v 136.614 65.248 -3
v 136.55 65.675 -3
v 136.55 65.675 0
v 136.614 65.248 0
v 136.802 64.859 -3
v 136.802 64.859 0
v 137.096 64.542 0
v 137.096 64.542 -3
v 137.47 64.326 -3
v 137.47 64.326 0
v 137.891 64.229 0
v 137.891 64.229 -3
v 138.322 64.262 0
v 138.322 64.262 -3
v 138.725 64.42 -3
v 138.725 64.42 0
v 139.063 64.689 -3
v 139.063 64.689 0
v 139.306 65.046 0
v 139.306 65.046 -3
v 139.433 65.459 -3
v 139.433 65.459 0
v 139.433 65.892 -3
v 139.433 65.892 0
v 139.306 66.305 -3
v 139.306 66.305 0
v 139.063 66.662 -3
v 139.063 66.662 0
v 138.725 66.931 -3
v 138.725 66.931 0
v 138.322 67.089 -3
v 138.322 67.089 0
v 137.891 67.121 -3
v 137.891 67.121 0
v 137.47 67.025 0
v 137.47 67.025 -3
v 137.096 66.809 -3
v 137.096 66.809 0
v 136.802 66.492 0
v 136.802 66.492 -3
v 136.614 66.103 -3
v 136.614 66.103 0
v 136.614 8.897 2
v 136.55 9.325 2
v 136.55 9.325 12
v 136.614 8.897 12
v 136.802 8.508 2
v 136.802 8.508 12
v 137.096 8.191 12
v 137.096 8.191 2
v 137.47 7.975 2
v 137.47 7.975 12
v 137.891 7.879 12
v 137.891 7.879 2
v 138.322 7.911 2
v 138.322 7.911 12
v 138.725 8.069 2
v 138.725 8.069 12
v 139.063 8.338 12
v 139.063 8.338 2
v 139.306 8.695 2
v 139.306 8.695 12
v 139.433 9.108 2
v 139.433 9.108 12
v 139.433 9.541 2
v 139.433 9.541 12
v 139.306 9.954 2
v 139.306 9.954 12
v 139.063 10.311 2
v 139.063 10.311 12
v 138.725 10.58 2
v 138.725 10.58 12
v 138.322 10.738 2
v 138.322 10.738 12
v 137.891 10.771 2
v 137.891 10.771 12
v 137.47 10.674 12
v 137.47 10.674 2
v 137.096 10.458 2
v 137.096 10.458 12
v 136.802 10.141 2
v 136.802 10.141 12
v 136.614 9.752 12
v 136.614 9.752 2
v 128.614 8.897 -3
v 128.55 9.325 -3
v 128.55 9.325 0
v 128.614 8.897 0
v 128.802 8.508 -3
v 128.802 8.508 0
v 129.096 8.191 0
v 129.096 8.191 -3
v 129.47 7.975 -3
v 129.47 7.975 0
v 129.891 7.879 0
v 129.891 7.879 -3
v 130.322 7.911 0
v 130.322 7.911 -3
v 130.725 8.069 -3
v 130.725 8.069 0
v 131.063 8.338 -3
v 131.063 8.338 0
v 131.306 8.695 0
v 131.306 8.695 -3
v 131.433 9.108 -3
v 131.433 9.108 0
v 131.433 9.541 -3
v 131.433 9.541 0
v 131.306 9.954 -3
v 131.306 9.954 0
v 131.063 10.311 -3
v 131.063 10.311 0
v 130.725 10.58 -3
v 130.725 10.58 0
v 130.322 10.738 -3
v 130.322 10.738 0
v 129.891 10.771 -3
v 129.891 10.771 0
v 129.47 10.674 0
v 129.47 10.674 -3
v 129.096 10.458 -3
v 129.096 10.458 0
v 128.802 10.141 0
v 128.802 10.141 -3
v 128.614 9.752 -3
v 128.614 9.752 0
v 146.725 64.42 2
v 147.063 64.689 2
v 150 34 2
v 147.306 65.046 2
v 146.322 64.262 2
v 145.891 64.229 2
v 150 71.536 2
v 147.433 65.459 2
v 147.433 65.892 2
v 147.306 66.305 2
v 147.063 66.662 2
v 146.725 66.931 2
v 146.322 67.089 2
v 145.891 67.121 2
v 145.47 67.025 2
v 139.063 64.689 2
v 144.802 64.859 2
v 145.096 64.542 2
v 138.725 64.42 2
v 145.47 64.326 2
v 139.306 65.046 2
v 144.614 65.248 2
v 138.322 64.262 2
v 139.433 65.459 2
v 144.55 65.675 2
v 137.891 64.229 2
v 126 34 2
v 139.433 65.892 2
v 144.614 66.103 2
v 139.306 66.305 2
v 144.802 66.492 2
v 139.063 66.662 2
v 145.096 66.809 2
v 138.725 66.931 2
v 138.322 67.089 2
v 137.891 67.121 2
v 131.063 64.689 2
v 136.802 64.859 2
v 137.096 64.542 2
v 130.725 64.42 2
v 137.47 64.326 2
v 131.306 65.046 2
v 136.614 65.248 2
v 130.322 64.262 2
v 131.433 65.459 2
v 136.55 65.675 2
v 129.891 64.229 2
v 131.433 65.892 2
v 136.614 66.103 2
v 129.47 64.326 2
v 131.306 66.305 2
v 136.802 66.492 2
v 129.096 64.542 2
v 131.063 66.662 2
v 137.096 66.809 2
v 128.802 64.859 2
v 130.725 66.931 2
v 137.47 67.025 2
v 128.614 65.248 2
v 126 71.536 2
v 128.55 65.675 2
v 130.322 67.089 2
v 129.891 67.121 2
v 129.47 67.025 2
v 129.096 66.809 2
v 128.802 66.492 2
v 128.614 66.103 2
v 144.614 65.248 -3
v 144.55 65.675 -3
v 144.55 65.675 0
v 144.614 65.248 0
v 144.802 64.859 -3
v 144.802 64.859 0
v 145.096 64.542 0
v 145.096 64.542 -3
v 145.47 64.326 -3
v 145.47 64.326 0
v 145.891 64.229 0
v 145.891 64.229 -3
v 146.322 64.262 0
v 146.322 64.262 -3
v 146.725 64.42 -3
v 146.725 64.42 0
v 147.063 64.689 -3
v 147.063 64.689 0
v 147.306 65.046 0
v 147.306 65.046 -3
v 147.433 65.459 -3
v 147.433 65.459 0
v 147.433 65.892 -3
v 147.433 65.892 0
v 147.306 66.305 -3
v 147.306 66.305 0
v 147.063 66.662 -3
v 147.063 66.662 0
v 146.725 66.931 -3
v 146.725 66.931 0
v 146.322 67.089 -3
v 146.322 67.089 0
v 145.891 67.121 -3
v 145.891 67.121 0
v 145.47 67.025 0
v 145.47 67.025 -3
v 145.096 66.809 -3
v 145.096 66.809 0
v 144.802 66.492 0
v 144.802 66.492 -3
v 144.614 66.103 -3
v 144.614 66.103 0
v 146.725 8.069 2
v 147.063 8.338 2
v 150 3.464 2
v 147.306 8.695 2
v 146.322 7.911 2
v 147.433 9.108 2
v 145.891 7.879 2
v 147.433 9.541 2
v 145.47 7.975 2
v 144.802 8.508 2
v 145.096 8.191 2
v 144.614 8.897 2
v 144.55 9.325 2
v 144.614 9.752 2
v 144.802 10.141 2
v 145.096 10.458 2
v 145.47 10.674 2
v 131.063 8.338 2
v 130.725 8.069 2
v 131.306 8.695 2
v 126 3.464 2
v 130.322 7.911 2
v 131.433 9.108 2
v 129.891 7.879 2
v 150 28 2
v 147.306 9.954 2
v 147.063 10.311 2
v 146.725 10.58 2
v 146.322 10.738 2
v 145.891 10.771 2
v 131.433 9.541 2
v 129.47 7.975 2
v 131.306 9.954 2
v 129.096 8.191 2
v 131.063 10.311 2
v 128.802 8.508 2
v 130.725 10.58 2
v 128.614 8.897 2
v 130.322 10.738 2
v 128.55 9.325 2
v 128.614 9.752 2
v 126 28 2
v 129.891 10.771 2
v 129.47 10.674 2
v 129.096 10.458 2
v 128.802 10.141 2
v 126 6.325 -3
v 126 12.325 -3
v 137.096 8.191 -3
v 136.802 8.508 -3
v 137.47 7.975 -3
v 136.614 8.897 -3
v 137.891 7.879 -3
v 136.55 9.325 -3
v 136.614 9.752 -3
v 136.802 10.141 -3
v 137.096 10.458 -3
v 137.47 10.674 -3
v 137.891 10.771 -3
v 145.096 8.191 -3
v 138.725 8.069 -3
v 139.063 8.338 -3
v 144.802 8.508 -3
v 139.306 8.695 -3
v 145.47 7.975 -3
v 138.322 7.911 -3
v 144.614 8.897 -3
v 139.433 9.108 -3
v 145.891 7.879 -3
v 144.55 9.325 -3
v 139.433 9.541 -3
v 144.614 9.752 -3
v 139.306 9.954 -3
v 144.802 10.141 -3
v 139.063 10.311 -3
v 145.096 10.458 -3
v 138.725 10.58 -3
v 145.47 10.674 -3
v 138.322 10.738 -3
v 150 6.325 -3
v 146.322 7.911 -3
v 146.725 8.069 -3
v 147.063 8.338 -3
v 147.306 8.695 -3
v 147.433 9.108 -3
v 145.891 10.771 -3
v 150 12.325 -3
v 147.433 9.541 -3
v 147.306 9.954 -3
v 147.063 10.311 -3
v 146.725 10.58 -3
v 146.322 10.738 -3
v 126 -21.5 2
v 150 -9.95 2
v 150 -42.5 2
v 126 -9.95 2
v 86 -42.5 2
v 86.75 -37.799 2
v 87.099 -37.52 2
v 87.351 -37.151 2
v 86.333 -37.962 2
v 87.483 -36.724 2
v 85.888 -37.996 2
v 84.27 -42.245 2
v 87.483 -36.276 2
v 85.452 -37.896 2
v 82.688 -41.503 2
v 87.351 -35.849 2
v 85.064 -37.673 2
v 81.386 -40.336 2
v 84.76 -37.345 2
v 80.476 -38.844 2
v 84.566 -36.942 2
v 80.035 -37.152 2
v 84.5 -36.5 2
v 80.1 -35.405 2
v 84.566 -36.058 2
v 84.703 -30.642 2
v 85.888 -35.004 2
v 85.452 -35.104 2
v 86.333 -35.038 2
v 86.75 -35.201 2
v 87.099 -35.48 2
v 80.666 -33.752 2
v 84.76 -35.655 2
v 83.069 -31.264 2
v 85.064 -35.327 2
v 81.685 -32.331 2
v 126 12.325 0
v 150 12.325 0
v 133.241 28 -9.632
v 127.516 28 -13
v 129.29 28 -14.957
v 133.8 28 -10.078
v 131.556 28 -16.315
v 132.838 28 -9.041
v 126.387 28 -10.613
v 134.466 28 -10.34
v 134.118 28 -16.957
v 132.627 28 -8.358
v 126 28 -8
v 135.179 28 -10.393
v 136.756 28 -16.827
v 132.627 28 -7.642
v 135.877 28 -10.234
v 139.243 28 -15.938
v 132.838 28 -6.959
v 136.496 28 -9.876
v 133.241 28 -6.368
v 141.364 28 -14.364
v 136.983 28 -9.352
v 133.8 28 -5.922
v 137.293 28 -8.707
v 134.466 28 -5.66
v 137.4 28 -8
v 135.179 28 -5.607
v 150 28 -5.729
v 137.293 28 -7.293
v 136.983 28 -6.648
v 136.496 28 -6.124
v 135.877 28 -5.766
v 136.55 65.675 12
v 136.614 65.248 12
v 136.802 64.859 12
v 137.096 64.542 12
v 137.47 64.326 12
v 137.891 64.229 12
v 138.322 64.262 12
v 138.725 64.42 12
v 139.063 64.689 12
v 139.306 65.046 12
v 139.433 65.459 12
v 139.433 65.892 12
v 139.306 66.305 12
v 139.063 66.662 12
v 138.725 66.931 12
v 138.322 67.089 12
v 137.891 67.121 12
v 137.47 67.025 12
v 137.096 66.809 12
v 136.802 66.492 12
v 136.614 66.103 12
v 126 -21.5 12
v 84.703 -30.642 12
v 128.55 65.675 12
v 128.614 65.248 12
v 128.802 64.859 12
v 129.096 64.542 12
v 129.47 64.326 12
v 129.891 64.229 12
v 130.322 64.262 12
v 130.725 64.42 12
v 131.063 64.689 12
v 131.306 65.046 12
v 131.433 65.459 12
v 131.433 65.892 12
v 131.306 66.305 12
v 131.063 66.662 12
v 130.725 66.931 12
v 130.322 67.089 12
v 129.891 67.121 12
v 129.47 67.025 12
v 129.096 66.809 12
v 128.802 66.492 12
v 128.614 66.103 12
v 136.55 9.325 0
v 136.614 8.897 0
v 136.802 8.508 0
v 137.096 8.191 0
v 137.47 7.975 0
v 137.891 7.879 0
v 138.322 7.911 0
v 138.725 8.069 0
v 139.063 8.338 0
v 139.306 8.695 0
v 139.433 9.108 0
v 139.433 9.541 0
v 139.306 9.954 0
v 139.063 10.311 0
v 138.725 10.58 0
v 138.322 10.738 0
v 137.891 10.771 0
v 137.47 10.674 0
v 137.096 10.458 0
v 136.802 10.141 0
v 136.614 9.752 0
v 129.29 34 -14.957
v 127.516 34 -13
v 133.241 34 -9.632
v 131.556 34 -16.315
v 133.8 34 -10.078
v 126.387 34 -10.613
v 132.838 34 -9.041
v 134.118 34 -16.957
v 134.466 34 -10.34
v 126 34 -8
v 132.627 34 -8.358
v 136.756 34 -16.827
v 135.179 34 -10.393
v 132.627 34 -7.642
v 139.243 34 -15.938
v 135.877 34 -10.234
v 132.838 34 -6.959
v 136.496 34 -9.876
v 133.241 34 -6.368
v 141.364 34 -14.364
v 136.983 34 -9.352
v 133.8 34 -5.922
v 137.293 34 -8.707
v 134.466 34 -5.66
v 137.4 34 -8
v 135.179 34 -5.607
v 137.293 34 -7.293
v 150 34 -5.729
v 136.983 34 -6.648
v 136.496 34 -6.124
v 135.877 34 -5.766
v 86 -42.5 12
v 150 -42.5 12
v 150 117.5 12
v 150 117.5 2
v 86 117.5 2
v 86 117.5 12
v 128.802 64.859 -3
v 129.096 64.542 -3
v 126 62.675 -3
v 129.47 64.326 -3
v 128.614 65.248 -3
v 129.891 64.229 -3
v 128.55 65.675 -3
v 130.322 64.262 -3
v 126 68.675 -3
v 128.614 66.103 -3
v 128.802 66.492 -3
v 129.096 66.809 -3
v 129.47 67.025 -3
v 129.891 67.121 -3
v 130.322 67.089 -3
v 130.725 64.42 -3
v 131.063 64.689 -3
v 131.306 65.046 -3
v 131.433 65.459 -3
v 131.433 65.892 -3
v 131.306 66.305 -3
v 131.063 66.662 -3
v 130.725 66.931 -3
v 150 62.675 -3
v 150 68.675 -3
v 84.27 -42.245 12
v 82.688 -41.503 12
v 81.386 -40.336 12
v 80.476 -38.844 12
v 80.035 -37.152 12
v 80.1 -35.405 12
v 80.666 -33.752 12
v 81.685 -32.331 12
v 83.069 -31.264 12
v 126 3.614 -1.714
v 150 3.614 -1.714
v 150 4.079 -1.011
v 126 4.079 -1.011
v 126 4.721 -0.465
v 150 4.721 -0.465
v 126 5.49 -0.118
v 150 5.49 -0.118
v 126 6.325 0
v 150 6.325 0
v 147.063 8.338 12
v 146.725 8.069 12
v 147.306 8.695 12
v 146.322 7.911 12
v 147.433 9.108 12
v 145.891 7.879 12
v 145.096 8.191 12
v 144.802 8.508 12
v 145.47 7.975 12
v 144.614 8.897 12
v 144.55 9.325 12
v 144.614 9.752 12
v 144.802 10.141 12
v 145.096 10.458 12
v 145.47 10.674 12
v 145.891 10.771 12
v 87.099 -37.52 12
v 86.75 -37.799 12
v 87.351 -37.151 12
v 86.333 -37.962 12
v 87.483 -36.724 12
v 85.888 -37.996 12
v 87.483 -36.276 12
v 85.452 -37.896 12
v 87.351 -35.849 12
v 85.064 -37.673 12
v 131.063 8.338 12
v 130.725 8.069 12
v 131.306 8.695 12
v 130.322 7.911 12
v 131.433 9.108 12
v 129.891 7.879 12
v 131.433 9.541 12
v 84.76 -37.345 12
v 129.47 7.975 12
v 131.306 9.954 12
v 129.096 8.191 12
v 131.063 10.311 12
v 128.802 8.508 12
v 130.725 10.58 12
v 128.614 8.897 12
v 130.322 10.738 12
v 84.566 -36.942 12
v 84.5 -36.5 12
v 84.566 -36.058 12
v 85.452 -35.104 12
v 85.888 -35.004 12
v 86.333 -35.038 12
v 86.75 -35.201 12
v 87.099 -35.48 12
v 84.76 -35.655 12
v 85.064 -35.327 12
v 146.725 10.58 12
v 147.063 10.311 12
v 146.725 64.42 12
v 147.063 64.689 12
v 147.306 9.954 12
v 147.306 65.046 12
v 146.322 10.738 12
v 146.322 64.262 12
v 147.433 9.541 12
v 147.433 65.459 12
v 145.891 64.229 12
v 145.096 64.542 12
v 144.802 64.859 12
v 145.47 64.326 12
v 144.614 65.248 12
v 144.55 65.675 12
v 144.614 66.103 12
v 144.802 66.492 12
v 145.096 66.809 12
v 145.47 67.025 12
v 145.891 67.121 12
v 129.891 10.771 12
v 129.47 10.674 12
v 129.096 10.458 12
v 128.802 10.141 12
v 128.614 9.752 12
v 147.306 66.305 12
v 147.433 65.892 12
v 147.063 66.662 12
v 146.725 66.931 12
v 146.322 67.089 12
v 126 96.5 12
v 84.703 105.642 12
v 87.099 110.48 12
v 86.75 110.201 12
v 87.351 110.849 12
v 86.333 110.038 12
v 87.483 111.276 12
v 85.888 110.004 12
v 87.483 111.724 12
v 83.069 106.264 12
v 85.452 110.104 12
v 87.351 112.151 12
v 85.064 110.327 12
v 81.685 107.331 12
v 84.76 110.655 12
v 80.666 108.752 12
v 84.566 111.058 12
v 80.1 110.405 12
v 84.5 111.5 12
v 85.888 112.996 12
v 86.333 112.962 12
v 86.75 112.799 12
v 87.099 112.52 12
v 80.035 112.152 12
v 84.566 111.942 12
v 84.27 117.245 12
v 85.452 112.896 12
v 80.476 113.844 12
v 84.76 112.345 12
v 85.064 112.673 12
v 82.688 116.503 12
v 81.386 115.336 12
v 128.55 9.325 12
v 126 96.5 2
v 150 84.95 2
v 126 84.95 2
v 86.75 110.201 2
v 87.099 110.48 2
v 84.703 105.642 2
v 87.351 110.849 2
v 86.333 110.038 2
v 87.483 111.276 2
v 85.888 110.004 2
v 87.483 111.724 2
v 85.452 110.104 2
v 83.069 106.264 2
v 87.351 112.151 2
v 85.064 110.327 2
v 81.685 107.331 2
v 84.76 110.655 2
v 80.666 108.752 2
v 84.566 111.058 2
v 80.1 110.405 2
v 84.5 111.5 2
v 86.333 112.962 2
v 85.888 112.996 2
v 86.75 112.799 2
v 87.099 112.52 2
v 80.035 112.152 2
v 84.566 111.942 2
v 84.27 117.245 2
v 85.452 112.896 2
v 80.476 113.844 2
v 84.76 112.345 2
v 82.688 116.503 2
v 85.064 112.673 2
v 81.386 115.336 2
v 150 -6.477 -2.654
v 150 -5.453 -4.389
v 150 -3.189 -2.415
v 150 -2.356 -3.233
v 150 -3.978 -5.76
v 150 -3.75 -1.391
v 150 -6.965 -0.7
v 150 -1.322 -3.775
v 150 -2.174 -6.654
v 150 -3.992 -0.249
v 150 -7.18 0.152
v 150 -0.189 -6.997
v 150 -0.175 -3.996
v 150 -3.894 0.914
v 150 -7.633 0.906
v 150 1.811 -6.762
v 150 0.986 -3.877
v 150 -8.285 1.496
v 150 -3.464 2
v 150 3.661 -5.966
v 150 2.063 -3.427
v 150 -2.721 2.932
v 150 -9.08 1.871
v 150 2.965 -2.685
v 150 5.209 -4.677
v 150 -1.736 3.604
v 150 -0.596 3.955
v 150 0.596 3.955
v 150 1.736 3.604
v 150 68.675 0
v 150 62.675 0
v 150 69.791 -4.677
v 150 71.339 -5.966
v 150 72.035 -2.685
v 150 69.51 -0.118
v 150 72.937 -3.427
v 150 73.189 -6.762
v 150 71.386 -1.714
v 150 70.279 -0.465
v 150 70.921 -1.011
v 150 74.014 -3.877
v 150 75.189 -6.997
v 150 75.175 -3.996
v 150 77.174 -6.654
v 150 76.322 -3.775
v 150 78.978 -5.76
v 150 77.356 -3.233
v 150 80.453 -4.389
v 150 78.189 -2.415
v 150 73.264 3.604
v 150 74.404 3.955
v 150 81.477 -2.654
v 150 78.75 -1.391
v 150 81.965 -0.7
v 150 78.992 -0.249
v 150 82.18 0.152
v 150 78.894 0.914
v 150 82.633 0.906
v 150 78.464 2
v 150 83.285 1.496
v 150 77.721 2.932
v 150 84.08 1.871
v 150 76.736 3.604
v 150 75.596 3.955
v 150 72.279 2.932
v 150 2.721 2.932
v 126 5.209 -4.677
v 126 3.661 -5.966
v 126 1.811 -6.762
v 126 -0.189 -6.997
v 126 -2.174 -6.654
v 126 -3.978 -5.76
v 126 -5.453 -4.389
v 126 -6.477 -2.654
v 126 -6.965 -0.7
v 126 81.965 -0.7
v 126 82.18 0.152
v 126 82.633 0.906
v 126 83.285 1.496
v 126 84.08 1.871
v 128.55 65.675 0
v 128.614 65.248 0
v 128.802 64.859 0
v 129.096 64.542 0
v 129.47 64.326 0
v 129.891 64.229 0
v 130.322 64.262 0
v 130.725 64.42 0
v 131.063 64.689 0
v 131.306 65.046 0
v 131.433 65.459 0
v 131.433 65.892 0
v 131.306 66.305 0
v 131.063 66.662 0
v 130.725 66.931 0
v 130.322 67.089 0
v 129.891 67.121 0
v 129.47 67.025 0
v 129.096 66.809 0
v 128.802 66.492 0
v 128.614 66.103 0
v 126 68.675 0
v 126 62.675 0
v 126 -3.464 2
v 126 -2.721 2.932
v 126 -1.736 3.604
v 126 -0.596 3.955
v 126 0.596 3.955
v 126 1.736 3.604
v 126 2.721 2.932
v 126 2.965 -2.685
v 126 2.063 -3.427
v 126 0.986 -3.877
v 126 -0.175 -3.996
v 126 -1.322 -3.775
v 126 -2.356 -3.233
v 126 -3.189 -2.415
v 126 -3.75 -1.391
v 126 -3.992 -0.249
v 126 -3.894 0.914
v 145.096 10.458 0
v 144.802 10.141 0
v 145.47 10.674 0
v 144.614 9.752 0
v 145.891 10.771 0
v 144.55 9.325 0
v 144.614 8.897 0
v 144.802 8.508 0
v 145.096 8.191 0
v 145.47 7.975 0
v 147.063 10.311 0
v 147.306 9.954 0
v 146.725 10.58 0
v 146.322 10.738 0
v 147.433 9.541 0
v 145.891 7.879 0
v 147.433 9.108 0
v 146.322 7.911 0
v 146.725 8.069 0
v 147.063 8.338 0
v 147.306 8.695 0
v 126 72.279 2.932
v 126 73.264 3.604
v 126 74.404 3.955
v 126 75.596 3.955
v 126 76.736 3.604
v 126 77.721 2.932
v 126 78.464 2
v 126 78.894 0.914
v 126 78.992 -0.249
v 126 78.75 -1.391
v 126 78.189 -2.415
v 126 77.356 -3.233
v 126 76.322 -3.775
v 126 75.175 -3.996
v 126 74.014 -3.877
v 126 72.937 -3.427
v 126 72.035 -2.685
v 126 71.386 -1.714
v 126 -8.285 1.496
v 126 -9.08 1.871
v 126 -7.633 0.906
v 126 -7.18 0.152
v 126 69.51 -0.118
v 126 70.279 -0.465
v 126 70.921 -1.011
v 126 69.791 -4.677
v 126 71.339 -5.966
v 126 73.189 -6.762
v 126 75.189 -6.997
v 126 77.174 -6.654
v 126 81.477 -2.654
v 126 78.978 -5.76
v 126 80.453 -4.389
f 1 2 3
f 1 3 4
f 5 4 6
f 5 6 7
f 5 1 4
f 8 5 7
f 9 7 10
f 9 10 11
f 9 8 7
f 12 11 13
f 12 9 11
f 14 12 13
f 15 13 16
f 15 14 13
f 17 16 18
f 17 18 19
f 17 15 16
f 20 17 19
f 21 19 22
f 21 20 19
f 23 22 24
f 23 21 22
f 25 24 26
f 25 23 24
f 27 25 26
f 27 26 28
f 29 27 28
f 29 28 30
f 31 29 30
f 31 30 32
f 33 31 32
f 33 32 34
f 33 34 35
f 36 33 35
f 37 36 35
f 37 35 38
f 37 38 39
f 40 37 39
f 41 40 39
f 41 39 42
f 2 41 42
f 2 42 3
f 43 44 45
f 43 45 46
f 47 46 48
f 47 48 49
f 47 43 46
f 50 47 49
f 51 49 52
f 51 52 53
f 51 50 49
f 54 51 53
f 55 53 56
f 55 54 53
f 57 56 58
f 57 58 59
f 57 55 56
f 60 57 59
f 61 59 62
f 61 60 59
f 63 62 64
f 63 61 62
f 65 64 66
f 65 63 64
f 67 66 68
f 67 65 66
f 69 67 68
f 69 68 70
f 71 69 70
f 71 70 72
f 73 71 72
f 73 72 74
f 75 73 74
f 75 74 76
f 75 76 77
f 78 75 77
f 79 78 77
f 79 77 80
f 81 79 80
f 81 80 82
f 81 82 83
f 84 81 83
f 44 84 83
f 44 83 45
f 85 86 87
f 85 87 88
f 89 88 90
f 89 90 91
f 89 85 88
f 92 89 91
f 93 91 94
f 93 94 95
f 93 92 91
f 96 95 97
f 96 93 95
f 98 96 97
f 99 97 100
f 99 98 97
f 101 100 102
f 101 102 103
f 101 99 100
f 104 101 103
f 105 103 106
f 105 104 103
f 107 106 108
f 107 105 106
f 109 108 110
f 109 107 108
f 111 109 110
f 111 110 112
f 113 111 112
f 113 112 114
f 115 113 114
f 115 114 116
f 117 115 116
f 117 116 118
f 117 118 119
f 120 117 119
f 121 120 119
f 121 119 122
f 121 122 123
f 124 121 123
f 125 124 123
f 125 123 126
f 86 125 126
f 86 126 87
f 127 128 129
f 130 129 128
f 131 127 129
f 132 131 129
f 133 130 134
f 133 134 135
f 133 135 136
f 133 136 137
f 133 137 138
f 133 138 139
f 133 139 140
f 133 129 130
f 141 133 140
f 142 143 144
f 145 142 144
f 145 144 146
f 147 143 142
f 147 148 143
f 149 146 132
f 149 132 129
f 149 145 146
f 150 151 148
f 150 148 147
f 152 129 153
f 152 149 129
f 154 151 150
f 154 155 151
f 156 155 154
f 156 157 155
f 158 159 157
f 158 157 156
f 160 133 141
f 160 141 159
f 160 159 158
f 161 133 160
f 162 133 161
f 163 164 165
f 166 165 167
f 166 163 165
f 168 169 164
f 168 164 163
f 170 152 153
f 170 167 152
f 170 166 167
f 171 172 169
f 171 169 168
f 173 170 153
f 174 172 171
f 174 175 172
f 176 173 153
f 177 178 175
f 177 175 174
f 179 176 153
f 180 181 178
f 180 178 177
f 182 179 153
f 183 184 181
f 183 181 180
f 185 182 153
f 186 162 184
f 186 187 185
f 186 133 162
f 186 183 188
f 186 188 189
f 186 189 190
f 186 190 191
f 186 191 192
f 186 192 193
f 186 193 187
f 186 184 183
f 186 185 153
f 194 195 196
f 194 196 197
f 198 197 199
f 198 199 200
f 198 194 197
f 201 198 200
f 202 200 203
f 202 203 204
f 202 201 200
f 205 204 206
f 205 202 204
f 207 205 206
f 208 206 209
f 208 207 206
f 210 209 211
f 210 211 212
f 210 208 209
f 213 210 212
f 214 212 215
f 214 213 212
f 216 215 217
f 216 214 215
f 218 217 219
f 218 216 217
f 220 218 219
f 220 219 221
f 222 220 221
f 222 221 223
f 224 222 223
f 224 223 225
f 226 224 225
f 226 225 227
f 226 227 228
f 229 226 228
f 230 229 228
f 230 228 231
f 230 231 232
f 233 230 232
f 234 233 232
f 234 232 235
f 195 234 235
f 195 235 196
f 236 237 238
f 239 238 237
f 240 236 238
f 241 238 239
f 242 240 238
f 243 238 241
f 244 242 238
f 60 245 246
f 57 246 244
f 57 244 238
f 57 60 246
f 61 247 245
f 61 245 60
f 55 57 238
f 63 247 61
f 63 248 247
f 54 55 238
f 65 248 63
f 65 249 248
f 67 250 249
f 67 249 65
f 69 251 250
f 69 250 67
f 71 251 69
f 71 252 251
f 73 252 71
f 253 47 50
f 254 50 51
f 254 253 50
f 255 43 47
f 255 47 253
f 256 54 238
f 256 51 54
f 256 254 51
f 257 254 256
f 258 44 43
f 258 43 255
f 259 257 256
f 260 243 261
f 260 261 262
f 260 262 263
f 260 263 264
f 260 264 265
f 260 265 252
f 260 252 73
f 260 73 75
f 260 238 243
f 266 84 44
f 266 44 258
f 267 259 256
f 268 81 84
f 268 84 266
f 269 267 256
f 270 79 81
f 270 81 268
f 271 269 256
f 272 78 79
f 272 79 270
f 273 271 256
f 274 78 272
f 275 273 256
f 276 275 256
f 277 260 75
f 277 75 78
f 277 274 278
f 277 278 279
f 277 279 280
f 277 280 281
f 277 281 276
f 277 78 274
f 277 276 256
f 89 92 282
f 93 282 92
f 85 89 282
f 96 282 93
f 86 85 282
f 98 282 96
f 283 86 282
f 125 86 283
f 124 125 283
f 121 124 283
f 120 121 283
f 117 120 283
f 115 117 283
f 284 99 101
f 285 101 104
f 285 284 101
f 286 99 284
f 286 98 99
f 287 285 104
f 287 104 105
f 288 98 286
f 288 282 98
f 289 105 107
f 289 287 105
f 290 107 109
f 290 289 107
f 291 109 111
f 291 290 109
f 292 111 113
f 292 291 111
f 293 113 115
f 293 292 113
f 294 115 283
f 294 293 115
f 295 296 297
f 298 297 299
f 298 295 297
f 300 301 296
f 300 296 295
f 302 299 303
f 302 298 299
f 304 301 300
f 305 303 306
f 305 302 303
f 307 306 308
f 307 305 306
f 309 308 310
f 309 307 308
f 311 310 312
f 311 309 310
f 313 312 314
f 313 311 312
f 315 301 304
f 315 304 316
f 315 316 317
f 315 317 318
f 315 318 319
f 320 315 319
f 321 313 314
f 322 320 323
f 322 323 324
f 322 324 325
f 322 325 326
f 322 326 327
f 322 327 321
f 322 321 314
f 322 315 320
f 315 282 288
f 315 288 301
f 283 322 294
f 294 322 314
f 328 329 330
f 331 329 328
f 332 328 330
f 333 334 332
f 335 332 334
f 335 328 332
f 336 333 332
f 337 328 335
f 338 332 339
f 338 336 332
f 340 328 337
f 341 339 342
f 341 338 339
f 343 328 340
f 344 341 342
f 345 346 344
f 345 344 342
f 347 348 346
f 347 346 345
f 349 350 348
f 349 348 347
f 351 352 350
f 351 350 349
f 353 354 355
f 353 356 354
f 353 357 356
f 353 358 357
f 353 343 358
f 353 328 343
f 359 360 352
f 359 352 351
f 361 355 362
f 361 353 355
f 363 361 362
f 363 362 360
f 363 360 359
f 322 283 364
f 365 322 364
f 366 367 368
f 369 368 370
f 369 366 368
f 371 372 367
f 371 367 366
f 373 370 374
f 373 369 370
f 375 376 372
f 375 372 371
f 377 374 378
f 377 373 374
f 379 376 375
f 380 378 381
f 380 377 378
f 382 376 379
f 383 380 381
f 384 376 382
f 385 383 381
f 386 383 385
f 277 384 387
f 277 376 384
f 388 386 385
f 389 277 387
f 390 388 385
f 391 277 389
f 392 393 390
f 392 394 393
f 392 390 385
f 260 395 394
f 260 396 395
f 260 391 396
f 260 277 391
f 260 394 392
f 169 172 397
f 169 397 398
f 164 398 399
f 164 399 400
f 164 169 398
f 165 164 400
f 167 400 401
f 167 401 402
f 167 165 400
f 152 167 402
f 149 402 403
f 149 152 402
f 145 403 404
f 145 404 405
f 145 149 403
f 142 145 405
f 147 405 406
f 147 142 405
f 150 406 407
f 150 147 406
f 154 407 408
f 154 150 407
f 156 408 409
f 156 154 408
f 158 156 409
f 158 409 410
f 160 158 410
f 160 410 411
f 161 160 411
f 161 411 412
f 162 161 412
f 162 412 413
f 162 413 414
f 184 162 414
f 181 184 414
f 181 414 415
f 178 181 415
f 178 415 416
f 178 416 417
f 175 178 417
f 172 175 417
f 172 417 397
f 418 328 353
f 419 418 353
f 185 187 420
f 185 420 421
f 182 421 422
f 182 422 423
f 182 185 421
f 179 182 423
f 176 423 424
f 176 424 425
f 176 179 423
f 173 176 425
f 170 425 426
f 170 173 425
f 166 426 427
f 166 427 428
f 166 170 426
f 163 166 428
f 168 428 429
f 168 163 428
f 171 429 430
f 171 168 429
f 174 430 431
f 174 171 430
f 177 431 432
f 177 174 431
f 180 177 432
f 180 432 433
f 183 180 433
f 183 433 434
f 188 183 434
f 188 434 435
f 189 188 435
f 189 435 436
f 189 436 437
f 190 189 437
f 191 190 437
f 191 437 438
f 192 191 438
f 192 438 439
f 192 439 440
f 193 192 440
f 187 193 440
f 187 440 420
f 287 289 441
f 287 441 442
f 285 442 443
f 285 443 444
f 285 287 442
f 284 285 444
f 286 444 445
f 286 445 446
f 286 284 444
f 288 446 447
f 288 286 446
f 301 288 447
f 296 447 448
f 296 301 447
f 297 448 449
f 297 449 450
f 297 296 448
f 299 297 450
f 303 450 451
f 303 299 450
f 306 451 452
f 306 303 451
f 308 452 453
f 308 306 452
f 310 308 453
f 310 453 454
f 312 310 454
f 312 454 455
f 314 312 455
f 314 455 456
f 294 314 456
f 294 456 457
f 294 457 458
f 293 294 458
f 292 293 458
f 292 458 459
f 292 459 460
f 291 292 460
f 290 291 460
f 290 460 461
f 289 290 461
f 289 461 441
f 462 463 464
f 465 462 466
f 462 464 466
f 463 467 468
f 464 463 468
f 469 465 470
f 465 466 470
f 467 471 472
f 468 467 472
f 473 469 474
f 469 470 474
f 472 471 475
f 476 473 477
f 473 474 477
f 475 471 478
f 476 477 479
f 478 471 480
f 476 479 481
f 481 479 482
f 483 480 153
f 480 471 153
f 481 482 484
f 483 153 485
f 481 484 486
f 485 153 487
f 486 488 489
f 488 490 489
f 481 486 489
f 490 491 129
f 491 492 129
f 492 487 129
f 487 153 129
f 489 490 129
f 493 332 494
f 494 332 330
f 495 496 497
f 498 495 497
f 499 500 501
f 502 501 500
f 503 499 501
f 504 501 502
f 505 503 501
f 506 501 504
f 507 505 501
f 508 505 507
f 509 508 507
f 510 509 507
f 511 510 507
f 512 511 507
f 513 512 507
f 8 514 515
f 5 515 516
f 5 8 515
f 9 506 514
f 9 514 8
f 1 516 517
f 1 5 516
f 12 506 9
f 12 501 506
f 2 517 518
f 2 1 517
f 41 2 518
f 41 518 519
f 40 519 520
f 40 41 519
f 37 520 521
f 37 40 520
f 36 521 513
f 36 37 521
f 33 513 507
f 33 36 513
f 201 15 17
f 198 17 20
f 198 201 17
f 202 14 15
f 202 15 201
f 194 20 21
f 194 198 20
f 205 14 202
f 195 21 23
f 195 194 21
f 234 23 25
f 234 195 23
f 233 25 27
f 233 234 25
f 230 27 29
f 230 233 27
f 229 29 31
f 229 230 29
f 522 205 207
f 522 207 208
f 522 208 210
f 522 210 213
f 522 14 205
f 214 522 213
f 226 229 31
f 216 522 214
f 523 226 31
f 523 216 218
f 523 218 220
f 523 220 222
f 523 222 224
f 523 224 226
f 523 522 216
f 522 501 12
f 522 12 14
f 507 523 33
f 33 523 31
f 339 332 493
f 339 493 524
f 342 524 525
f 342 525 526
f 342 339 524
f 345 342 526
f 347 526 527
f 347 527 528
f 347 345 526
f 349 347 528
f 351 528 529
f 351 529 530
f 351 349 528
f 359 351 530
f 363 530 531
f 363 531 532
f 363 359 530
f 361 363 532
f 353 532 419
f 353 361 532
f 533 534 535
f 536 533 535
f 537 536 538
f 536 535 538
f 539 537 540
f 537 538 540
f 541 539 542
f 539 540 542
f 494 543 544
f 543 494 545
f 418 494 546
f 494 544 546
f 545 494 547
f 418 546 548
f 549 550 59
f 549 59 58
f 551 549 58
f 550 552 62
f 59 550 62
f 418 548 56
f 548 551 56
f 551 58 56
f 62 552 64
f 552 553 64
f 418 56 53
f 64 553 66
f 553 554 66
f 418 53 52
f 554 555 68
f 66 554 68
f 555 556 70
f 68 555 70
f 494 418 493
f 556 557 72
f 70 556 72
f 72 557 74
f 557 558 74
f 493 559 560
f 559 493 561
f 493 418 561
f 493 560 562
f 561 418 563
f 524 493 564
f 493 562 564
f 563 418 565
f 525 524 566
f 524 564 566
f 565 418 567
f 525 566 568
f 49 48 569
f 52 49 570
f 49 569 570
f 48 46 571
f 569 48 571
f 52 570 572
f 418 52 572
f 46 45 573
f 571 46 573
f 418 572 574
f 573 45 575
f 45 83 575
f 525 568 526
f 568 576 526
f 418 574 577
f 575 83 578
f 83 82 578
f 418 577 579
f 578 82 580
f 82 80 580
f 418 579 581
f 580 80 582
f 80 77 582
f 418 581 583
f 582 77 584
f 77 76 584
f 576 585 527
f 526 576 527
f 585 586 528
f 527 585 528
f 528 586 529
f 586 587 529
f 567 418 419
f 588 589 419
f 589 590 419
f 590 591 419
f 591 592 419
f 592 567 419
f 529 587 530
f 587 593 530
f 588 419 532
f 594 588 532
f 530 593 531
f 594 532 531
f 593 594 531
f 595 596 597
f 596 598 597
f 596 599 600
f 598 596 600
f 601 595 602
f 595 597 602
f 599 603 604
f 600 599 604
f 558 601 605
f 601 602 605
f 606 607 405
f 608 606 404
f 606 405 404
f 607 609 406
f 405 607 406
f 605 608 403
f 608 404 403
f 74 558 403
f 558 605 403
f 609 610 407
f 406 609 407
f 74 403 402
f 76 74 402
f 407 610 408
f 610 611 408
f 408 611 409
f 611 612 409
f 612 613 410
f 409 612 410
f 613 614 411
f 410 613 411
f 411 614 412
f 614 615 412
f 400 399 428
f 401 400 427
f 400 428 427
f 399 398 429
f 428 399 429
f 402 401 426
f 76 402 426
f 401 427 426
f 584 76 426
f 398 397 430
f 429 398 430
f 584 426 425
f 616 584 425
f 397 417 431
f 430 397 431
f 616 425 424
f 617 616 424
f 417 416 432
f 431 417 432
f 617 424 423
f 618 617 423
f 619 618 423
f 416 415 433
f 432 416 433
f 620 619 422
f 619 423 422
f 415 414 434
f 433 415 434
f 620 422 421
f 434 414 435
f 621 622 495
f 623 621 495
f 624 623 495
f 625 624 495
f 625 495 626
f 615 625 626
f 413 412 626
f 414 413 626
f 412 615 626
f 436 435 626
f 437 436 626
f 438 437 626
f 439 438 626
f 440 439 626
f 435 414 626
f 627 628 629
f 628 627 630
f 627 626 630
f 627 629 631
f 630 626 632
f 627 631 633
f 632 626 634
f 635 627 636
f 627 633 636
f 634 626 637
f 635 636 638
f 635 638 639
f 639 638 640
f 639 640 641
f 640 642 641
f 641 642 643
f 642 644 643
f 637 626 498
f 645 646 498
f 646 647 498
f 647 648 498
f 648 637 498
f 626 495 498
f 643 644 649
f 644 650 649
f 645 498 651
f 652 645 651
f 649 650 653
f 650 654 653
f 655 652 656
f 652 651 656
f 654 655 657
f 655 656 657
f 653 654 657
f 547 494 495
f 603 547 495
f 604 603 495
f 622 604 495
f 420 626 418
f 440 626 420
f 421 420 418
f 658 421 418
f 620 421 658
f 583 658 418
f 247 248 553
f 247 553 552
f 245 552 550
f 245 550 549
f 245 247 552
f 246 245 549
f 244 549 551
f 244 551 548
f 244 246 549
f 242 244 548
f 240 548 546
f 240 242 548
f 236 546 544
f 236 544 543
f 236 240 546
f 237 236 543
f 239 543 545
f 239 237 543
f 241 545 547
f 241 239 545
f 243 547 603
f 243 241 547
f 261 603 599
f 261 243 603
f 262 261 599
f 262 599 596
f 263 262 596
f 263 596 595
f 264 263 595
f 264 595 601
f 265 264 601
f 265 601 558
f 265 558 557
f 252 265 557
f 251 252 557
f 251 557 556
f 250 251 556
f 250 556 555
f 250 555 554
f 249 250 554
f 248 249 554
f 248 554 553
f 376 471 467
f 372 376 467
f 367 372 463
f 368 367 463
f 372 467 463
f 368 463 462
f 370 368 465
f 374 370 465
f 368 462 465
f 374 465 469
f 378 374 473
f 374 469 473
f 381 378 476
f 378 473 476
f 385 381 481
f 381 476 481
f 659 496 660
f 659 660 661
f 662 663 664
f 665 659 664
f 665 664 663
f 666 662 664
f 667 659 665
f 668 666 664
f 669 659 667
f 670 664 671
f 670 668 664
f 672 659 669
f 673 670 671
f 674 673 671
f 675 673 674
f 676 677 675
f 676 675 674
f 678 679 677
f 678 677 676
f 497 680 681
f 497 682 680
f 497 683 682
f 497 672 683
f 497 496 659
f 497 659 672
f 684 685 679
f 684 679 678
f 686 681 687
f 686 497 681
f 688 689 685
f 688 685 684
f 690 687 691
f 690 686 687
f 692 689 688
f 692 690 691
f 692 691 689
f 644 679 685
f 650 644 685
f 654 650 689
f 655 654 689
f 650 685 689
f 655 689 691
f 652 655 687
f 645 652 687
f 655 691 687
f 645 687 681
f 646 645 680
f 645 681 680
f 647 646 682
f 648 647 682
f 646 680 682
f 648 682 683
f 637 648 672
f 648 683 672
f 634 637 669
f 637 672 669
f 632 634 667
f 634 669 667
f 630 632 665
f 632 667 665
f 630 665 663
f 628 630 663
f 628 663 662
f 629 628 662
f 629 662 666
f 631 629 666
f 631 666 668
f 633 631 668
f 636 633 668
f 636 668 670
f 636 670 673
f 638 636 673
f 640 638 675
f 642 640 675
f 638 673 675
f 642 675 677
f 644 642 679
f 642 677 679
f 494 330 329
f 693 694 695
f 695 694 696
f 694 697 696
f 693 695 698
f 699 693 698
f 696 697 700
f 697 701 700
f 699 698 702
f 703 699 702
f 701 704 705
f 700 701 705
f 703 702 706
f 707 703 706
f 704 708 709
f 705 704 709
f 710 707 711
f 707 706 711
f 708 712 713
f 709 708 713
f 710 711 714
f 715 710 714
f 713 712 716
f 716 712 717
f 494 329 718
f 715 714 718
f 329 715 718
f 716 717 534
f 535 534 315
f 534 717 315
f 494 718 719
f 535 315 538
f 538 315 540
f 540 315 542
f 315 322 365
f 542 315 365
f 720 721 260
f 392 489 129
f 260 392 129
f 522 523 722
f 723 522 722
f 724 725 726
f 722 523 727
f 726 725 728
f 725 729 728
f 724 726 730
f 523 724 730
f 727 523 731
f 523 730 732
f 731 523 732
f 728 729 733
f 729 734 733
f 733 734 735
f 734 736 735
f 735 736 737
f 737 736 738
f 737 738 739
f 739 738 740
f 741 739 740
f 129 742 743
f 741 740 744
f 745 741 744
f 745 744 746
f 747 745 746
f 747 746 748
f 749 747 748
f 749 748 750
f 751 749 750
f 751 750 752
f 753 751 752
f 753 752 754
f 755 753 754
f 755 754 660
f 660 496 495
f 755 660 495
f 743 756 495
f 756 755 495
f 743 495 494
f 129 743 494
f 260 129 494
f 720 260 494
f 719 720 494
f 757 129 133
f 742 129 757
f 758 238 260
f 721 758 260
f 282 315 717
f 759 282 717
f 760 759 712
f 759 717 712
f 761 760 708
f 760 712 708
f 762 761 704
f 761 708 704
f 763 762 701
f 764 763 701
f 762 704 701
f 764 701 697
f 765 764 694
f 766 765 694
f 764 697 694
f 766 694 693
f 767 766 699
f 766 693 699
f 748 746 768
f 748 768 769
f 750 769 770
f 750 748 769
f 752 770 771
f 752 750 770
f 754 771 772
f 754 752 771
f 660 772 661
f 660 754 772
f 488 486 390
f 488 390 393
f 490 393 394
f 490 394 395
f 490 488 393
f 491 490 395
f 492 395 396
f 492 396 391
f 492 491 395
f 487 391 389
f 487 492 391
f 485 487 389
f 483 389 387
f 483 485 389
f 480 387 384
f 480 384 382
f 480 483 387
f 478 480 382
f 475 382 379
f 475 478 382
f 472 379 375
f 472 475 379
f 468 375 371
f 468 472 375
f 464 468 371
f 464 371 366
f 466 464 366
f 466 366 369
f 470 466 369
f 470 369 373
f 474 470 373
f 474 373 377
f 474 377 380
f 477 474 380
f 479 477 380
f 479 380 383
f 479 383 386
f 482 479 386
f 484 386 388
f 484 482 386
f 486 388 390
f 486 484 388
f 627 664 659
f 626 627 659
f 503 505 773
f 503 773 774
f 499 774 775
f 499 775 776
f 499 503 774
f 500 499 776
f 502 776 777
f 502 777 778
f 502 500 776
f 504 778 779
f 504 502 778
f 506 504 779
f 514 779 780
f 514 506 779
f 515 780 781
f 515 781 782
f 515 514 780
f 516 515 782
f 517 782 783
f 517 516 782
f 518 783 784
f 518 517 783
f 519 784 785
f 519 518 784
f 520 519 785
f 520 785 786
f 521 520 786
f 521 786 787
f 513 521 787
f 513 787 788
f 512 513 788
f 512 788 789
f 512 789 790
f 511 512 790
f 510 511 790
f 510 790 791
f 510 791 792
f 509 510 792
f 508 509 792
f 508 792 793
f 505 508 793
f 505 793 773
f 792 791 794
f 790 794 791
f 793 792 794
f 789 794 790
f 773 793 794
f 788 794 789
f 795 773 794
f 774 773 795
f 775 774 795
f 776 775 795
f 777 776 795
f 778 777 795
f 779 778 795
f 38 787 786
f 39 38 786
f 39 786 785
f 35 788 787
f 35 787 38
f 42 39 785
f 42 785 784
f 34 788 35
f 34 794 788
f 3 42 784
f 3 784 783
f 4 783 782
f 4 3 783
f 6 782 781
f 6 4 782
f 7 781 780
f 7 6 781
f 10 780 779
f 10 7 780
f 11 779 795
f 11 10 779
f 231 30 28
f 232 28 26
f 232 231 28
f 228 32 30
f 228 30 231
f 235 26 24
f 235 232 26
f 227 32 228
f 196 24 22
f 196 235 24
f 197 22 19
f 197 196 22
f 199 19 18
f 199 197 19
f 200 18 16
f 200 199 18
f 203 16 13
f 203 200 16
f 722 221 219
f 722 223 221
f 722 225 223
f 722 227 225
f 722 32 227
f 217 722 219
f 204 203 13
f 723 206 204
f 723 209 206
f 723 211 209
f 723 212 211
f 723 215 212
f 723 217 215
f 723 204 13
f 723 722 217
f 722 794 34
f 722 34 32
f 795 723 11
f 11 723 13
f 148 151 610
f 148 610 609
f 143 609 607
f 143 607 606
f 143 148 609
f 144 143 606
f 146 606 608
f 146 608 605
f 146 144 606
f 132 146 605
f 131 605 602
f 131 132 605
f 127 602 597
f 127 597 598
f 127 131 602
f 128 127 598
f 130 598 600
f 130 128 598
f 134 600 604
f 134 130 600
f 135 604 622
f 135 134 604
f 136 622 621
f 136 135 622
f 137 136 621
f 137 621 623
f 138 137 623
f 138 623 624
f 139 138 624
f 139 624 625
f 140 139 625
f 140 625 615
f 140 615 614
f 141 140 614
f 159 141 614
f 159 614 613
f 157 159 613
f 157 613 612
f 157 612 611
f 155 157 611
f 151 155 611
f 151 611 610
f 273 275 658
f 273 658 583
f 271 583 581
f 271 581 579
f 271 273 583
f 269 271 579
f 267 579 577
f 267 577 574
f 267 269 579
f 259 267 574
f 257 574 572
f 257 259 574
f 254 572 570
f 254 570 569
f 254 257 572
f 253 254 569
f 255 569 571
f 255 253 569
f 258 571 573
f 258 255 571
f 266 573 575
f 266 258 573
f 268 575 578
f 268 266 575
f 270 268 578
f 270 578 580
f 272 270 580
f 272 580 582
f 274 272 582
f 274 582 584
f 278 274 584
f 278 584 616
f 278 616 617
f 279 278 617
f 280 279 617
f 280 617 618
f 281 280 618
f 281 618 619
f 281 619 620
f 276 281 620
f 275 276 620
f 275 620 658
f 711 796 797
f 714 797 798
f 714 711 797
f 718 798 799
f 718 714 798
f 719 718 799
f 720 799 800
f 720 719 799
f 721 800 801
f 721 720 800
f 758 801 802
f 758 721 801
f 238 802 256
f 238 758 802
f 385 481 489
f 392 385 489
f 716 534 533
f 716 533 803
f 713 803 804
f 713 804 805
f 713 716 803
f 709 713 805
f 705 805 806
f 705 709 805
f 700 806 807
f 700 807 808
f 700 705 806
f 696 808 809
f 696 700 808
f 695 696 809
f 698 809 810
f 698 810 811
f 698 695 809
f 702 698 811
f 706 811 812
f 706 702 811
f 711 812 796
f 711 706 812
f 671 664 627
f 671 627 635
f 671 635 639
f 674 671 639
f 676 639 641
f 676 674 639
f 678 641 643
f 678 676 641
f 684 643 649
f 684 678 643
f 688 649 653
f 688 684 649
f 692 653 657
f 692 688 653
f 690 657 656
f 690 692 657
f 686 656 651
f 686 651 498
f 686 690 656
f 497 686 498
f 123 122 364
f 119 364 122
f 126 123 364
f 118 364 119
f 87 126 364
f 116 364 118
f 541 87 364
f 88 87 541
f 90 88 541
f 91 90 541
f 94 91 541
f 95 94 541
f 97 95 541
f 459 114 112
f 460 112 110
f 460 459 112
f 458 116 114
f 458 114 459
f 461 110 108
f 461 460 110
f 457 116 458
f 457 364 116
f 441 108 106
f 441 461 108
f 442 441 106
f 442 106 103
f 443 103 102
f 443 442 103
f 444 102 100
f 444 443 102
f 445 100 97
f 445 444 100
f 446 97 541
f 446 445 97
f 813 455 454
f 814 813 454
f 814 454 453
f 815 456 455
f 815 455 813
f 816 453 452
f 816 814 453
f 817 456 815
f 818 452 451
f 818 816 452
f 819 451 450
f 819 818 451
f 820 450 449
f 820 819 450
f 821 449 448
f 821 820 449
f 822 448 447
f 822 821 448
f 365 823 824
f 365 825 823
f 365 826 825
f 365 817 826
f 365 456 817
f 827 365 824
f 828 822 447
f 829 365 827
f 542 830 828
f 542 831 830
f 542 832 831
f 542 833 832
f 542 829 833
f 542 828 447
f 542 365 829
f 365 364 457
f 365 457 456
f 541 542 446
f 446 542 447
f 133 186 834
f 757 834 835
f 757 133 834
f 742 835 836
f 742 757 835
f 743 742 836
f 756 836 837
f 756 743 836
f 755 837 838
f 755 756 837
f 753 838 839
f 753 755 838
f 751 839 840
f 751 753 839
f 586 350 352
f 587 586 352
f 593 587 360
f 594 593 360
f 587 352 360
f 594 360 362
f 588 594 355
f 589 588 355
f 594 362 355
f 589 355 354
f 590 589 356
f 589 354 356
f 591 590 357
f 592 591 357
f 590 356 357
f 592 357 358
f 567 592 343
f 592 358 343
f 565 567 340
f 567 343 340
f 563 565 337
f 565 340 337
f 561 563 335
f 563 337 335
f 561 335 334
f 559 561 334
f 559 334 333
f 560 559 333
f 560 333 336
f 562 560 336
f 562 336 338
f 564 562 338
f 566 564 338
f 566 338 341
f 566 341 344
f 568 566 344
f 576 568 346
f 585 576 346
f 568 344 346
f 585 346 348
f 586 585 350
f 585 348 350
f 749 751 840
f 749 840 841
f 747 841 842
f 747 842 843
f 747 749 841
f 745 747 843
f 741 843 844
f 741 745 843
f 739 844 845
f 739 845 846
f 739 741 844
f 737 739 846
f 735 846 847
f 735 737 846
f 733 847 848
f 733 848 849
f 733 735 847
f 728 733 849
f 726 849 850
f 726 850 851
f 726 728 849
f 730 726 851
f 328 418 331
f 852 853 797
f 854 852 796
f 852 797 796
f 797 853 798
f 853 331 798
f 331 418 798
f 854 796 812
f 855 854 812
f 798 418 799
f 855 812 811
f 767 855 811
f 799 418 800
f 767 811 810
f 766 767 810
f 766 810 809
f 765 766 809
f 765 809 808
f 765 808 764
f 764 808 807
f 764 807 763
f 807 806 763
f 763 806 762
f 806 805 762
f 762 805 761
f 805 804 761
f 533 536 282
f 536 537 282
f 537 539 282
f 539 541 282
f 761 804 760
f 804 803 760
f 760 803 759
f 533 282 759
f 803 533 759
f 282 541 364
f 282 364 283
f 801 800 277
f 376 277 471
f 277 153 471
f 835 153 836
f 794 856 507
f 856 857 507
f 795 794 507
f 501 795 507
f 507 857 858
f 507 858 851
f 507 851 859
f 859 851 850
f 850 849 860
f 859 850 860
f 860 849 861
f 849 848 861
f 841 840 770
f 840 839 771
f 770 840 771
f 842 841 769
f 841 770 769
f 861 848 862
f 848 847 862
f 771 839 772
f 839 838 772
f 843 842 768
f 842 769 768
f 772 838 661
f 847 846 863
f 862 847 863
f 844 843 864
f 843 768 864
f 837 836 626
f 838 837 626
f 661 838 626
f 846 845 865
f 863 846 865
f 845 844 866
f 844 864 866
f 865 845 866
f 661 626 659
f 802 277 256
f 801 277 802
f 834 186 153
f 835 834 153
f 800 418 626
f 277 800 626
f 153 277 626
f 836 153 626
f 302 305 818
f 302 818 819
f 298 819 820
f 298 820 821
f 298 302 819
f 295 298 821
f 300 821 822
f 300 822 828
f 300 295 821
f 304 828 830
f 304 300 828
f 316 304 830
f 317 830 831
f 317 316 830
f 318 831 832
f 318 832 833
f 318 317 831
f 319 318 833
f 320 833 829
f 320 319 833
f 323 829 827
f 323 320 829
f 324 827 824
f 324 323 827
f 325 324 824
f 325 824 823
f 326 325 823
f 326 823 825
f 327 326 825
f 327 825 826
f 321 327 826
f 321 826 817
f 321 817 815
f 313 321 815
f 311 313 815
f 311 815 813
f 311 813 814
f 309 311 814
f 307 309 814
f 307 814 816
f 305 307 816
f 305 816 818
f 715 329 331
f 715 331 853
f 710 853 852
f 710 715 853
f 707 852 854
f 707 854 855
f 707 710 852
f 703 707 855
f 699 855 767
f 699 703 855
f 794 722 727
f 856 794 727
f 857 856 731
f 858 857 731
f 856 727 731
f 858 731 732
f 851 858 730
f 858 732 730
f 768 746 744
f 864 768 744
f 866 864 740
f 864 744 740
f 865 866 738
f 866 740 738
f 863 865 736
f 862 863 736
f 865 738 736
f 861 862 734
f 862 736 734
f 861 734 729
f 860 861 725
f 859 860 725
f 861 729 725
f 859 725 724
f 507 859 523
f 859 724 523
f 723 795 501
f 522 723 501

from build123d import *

# Parameters (mm, degrees)
SKETCH016_R        = 1.5
PAD011_DEPTH       = 10
SKETCH018_R        = 4
POCKET006005_DEPTH = 70.001
SKETCH019_W        = 2.985647
SKETCH019_H        = 2.199577
PAD012_DEPTH       = 24
SKETCH020_R        = 2.4
PAD013_DEPTH       = 6
SKETCH021_R        = 1.45
POCKET006006_DEPTH = 15.001


with BuildPart() as pocket006006:
    # Sketch016 → Pad011 (new body)
    with BuildSketch(Plane.XY.offset(2)):
        with BuildLine():
            ThreePointArc((-84.702782, 105.641821), (-80.035159, 112.152274), (-85.999598, 117.5))
            Line((-149.999599, 117.5), (-85.999598, 117.5))
            Line((-149.999599, -42.5), (-149.999599, 117.5))
            Line((-85.999599, -42.5), (-149.999599, -42.5))
            ThreePointArc((-85.999599, -42.5), (-80.035159, -37.152275), (-84.702781, -30.641821))
            Line((-125.999599, -21.5), (-84.702781, -30.641821))
            Line((-125.999599, 96.5), (-125.999599, -21.5))
            Line((-84.702782, 105.641821), (-125.999599, 96.5))
        make_face()
        with Locations((-85.999599, 111.5)):
            Circle(SKETCH016_R, mode=Mode.SUBTRACT)
        with Locations((-85.999599, -36.5)):
            Circle(SKETCH016_R, mode=Mode.SUBTRACT)
    extrude(amount=PAD011_DEPTH)

    # Sketch018 → Pocket006005 (cut, through all)
    with BuildSketch(Plane(origin=(-149.999599, 0, 2), x_dir=(0, -1, 0), z_dir=(-1, 0, 0))):
        with Locations((-75, -2)):
            Circle(SKETCH018_R)
        with Locations((0, -2)):
            Circle(SKETCH018_R)
    extrude(amount=-POCKET006005_DEPTH, mode=Mode.SUBTRACT)

    # Sketch019 → Pad012 (new body)
    with BuildSketch(Plane(origin=(-149.999599, 0, 2), x_dir=(0, -1, 0), z_dir=(-1, 0, 0))):
        with BuildLine():
            ThreePointArc((-3.614026, -3.714297), (1.858661, -5.541946), (3.464102, 0))
            Line((3.464102, 0), (9.949874, 0))
            ThreePointArc((9.949874, 0), (7.937413, -0.775141), (6.964912, -2.700001))
            ThreePointArc((-6.324555, -5), (1.193739, -8.897462), (6.964912, -2.700001))
            Line((-6.324555, -5), (-12.324555, -5))
            Line((-12.324555, -5), (-12.324555, -2))
            Line((-12.324555, -2), (-6.324546, -2))
            ThreePointArc((-3.614026, -3.714297), (-4.720978, -2.464543), (-6.324546, -2))
        make_face()
        with BuildLine():
            ThreePointArc((-78.464102, 0), (-76.858656, -5.541948), (-71.385969, -3.714287))
            ThreePointArc((-68.675445, -2), (-70.279013, -2.464538), (-71.385969, -3.714287))
            Line((-68.675445, -2), (-62.675445, -2))
            Line((-62.675445, -2), (-62.675445, -5))
            Line((-62.675445, -5), (-68.675445, -5))
            ThreePointArc((-81.964912, -2.700001), (-76.193739, -8.897462), (-68.675445, -5))
            ThreePointArc((-81.964912, -2.700001), (-82.937413, -0.775141), (-84.949874, 0))
            Line((-84.949874, 0), (-78.464102, 0))
        make_face()
        with Locations((-32.507176, -1.099789)):
            Rectangle(SKETCH019_W, SKETCH019_H)
    extrude(amount=-PAD012_DEPTH)

    # Sketch020 → Pad013 (new body)
    with BuildSketch(Plane(origin=(0, 34, 2), x_dir=(-1, 0, 0), z_dir=(0, 1, 0))):
        with BuildLine():
            Line((149.999599, 0), (125.999599, 0))
            Line((125.999599, 0), (125.999599, -9.999972))
            ThreePointArc((125.999599, -9.999972), (131.555682, -18.315281), (141.364245, -16.364245))
            Line((141.364245, -16.364245), (149.999599, -7.728891))
            Line((149.999599, -7.728891), (149.999599, 0))
        make_face()
        with Locations((135, -10)):
            Circle(SKETCH020_R, mode=Mode.SUBTRACT)
    extrude(amount=-PAD013_DEPTH)

    # Sketch021 → Pocket006006 (cut, through all)
    with BuildSketch(Plane(origin=(0, 0, -3), x_dir=(1, 0, 0), z_dir=(0, 0, -1))):
        with Locations((-145.999599, -9.324555)):
            Circle(SKETCH021_R)
        with Locations((-137.999599, -9.324555)):
            Circle(SKETCH021_R)
        with Locations((-129.999599, -9.324555)):
            Circle(SKETCH021_R)
        with Locations((-145.999599, -65.675445)):
            Circle(SKETCH021_R)
        with Locations((-137.999599, -65.675445)):
            Circle(SKETCH021_R)
        with Locations((-129.999599, -65.675445)):
            Circle(SKETCH021_R)
    extrude(amount=-POCKET006006_DEPTH, mode=Mode.SUBTRACT)


with BuildPart() as part_mirroring:
    # Part__Mirroring: instance of Pocket006006
    add(pocket006006.part.mirror(Plane(origin=(0, 0, 0), x_dir=(0, -1, 0), z_dir=(1, 0, 0))))


solid = part_mirroring.part
